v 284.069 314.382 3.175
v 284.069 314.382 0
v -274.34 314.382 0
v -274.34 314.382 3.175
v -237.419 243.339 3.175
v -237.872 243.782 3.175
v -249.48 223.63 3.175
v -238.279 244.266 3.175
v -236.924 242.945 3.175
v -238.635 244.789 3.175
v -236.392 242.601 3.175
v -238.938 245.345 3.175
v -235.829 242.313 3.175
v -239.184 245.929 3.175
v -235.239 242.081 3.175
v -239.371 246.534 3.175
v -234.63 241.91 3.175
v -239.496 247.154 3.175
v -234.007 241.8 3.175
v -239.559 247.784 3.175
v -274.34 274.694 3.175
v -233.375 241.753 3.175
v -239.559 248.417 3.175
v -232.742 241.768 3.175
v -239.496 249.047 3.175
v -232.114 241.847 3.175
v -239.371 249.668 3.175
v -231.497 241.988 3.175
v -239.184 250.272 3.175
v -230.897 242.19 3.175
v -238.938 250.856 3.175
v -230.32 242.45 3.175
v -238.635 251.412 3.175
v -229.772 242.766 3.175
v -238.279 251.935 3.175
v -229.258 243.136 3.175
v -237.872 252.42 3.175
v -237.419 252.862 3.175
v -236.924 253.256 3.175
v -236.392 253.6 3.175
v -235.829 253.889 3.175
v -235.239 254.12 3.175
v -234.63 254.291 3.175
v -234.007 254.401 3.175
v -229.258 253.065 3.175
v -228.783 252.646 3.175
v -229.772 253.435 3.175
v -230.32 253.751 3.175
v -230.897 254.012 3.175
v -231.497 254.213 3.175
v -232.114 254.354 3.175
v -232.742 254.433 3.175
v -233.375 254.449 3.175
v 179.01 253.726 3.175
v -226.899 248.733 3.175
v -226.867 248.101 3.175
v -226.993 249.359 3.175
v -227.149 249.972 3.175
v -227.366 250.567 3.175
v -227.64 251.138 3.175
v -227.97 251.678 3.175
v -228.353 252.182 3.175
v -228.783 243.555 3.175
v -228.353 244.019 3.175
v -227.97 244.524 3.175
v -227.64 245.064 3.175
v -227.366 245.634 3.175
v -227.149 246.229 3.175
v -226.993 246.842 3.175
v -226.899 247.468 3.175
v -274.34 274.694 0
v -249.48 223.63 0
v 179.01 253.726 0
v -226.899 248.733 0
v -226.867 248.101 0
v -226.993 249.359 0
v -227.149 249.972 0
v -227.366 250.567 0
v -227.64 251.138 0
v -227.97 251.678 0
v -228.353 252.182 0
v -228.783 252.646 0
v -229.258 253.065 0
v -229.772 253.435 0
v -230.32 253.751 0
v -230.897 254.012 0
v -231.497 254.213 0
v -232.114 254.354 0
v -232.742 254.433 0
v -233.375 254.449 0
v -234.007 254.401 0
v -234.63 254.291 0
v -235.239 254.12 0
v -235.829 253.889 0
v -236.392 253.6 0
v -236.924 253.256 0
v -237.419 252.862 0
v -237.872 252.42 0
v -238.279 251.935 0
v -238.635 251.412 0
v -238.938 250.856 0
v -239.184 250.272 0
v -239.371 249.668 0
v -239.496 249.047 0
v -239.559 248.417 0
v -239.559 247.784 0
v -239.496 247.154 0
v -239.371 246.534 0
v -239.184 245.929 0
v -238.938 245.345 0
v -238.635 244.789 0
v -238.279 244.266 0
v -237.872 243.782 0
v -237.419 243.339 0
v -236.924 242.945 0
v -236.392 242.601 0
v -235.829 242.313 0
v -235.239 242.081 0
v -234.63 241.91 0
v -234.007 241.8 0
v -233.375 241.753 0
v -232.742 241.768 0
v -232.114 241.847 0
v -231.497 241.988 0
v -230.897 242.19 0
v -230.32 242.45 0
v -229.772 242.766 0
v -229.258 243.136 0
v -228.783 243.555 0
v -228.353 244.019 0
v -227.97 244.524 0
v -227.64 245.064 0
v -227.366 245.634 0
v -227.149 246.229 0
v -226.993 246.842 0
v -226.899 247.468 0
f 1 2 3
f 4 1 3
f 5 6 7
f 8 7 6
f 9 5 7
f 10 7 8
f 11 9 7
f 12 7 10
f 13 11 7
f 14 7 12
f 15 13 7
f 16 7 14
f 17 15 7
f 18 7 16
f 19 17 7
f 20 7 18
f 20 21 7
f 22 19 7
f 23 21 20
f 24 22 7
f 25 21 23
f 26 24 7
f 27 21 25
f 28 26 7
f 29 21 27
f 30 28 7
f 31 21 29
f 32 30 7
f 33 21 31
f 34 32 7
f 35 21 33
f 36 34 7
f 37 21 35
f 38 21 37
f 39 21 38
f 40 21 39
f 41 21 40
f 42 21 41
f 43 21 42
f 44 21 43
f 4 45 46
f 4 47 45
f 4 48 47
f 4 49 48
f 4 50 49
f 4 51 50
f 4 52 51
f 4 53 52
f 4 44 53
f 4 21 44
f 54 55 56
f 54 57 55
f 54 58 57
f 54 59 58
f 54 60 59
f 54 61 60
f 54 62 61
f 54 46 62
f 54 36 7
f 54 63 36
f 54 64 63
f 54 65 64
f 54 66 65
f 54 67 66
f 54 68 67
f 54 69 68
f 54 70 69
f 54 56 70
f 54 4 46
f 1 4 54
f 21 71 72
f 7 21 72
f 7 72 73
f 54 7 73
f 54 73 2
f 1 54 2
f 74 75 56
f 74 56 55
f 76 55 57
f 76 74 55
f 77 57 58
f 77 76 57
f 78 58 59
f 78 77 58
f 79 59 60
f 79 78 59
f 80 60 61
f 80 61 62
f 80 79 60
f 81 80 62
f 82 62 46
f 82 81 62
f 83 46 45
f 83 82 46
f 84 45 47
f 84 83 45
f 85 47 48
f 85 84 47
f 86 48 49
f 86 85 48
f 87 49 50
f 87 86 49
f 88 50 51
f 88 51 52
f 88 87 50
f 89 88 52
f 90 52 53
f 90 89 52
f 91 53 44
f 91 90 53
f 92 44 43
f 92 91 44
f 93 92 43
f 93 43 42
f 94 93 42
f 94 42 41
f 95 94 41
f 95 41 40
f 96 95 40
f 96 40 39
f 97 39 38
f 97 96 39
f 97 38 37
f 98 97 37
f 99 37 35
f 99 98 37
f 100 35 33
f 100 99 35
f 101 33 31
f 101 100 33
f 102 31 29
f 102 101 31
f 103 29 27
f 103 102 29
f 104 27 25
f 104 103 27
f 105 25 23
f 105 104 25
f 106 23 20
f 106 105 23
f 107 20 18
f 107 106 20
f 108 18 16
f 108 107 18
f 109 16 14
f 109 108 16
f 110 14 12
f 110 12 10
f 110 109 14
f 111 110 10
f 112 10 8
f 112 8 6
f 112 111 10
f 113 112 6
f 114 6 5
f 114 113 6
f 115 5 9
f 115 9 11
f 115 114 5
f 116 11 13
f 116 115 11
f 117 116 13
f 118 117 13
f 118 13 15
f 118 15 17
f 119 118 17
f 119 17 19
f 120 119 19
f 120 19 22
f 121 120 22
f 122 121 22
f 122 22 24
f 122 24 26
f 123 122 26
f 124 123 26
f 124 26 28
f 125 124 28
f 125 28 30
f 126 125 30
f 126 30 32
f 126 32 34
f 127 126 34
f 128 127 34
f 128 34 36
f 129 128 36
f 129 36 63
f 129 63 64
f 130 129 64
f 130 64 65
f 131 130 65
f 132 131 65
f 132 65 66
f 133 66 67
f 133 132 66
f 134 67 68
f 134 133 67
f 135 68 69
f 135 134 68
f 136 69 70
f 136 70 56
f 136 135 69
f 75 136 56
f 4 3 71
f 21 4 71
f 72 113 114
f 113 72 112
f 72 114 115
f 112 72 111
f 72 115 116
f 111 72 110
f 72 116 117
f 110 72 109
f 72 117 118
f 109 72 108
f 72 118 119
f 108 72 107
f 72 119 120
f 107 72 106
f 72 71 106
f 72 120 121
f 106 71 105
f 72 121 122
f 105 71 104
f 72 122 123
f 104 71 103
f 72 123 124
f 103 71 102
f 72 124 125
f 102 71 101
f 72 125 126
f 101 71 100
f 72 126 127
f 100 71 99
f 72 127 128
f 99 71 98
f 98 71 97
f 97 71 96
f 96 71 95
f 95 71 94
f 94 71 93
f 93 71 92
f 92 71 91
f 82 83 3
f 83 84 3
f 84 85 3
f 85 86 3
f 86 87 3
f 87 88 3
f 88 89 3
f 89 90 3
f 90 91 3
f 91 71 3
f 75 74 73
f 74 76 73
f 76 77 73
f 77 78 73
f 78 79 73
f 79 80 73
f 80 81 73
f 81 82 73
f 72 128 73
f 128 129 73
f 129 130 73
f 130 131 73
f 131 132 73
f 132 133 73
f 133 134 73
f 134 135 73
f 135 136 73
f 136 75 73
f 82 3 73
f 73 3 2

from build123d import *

# Parameters (mm, degrees)
F0_R     = 22.225
F0_R_2   = 6.35
F1_DEPTH = 3.175


# Not quite as in the source:
# - a feature names something its author has since deleted; it is built from what else it names


with BuildPart() as f1:
    # F0 (on Top) → F1 (new body)
    with BuildSketch(Plane.XY):
        Polygon((-217.8399659125, 274.6944633329), (-274.3403279131, 274.6944633329), (-249.4802269343, 223.6304721332), (-194.8479709943, 227.4676629604), align=None)
        with Locations((-233.2169740796, 248.1006040146)):
            Circle(F0_R, mode=Mode.SUBTRACT)
        with Locations((-233.2169740796, 248.1006040146)):
            Circle(F0_R)
        with Locations((-233.2169740796, 248.1006040146)):
            Circle(F0_R_2, mode=Mode.SUBTRACT)
        Polygon((-274.3403279131, 314.3819633329), (-274.3403279131, 274.6944633329), (-217.8399659125, 274.6944633329), (-233.0653279131, 305.9681798747), (-233.0653279131, 314.3819633329), align=None)
        Polygon((-233.0653279131, 305.9681798747), (-217.8399659125, 274.6944633329), (215.3278746861, 274.6944633329), (284.0686411115, 314.3819633329), (-233.0653279131, 314.3819633329), align=None)
        Polygon((215.3278746861, 274.6944633329), (-217.8399659125, 274.6944633329), (-194.8479709943, 227.4676629604), (179.0097919037, 253.726208462), align=None)
    extrude(amount=F1_DEPTH)


solid = f1.part
